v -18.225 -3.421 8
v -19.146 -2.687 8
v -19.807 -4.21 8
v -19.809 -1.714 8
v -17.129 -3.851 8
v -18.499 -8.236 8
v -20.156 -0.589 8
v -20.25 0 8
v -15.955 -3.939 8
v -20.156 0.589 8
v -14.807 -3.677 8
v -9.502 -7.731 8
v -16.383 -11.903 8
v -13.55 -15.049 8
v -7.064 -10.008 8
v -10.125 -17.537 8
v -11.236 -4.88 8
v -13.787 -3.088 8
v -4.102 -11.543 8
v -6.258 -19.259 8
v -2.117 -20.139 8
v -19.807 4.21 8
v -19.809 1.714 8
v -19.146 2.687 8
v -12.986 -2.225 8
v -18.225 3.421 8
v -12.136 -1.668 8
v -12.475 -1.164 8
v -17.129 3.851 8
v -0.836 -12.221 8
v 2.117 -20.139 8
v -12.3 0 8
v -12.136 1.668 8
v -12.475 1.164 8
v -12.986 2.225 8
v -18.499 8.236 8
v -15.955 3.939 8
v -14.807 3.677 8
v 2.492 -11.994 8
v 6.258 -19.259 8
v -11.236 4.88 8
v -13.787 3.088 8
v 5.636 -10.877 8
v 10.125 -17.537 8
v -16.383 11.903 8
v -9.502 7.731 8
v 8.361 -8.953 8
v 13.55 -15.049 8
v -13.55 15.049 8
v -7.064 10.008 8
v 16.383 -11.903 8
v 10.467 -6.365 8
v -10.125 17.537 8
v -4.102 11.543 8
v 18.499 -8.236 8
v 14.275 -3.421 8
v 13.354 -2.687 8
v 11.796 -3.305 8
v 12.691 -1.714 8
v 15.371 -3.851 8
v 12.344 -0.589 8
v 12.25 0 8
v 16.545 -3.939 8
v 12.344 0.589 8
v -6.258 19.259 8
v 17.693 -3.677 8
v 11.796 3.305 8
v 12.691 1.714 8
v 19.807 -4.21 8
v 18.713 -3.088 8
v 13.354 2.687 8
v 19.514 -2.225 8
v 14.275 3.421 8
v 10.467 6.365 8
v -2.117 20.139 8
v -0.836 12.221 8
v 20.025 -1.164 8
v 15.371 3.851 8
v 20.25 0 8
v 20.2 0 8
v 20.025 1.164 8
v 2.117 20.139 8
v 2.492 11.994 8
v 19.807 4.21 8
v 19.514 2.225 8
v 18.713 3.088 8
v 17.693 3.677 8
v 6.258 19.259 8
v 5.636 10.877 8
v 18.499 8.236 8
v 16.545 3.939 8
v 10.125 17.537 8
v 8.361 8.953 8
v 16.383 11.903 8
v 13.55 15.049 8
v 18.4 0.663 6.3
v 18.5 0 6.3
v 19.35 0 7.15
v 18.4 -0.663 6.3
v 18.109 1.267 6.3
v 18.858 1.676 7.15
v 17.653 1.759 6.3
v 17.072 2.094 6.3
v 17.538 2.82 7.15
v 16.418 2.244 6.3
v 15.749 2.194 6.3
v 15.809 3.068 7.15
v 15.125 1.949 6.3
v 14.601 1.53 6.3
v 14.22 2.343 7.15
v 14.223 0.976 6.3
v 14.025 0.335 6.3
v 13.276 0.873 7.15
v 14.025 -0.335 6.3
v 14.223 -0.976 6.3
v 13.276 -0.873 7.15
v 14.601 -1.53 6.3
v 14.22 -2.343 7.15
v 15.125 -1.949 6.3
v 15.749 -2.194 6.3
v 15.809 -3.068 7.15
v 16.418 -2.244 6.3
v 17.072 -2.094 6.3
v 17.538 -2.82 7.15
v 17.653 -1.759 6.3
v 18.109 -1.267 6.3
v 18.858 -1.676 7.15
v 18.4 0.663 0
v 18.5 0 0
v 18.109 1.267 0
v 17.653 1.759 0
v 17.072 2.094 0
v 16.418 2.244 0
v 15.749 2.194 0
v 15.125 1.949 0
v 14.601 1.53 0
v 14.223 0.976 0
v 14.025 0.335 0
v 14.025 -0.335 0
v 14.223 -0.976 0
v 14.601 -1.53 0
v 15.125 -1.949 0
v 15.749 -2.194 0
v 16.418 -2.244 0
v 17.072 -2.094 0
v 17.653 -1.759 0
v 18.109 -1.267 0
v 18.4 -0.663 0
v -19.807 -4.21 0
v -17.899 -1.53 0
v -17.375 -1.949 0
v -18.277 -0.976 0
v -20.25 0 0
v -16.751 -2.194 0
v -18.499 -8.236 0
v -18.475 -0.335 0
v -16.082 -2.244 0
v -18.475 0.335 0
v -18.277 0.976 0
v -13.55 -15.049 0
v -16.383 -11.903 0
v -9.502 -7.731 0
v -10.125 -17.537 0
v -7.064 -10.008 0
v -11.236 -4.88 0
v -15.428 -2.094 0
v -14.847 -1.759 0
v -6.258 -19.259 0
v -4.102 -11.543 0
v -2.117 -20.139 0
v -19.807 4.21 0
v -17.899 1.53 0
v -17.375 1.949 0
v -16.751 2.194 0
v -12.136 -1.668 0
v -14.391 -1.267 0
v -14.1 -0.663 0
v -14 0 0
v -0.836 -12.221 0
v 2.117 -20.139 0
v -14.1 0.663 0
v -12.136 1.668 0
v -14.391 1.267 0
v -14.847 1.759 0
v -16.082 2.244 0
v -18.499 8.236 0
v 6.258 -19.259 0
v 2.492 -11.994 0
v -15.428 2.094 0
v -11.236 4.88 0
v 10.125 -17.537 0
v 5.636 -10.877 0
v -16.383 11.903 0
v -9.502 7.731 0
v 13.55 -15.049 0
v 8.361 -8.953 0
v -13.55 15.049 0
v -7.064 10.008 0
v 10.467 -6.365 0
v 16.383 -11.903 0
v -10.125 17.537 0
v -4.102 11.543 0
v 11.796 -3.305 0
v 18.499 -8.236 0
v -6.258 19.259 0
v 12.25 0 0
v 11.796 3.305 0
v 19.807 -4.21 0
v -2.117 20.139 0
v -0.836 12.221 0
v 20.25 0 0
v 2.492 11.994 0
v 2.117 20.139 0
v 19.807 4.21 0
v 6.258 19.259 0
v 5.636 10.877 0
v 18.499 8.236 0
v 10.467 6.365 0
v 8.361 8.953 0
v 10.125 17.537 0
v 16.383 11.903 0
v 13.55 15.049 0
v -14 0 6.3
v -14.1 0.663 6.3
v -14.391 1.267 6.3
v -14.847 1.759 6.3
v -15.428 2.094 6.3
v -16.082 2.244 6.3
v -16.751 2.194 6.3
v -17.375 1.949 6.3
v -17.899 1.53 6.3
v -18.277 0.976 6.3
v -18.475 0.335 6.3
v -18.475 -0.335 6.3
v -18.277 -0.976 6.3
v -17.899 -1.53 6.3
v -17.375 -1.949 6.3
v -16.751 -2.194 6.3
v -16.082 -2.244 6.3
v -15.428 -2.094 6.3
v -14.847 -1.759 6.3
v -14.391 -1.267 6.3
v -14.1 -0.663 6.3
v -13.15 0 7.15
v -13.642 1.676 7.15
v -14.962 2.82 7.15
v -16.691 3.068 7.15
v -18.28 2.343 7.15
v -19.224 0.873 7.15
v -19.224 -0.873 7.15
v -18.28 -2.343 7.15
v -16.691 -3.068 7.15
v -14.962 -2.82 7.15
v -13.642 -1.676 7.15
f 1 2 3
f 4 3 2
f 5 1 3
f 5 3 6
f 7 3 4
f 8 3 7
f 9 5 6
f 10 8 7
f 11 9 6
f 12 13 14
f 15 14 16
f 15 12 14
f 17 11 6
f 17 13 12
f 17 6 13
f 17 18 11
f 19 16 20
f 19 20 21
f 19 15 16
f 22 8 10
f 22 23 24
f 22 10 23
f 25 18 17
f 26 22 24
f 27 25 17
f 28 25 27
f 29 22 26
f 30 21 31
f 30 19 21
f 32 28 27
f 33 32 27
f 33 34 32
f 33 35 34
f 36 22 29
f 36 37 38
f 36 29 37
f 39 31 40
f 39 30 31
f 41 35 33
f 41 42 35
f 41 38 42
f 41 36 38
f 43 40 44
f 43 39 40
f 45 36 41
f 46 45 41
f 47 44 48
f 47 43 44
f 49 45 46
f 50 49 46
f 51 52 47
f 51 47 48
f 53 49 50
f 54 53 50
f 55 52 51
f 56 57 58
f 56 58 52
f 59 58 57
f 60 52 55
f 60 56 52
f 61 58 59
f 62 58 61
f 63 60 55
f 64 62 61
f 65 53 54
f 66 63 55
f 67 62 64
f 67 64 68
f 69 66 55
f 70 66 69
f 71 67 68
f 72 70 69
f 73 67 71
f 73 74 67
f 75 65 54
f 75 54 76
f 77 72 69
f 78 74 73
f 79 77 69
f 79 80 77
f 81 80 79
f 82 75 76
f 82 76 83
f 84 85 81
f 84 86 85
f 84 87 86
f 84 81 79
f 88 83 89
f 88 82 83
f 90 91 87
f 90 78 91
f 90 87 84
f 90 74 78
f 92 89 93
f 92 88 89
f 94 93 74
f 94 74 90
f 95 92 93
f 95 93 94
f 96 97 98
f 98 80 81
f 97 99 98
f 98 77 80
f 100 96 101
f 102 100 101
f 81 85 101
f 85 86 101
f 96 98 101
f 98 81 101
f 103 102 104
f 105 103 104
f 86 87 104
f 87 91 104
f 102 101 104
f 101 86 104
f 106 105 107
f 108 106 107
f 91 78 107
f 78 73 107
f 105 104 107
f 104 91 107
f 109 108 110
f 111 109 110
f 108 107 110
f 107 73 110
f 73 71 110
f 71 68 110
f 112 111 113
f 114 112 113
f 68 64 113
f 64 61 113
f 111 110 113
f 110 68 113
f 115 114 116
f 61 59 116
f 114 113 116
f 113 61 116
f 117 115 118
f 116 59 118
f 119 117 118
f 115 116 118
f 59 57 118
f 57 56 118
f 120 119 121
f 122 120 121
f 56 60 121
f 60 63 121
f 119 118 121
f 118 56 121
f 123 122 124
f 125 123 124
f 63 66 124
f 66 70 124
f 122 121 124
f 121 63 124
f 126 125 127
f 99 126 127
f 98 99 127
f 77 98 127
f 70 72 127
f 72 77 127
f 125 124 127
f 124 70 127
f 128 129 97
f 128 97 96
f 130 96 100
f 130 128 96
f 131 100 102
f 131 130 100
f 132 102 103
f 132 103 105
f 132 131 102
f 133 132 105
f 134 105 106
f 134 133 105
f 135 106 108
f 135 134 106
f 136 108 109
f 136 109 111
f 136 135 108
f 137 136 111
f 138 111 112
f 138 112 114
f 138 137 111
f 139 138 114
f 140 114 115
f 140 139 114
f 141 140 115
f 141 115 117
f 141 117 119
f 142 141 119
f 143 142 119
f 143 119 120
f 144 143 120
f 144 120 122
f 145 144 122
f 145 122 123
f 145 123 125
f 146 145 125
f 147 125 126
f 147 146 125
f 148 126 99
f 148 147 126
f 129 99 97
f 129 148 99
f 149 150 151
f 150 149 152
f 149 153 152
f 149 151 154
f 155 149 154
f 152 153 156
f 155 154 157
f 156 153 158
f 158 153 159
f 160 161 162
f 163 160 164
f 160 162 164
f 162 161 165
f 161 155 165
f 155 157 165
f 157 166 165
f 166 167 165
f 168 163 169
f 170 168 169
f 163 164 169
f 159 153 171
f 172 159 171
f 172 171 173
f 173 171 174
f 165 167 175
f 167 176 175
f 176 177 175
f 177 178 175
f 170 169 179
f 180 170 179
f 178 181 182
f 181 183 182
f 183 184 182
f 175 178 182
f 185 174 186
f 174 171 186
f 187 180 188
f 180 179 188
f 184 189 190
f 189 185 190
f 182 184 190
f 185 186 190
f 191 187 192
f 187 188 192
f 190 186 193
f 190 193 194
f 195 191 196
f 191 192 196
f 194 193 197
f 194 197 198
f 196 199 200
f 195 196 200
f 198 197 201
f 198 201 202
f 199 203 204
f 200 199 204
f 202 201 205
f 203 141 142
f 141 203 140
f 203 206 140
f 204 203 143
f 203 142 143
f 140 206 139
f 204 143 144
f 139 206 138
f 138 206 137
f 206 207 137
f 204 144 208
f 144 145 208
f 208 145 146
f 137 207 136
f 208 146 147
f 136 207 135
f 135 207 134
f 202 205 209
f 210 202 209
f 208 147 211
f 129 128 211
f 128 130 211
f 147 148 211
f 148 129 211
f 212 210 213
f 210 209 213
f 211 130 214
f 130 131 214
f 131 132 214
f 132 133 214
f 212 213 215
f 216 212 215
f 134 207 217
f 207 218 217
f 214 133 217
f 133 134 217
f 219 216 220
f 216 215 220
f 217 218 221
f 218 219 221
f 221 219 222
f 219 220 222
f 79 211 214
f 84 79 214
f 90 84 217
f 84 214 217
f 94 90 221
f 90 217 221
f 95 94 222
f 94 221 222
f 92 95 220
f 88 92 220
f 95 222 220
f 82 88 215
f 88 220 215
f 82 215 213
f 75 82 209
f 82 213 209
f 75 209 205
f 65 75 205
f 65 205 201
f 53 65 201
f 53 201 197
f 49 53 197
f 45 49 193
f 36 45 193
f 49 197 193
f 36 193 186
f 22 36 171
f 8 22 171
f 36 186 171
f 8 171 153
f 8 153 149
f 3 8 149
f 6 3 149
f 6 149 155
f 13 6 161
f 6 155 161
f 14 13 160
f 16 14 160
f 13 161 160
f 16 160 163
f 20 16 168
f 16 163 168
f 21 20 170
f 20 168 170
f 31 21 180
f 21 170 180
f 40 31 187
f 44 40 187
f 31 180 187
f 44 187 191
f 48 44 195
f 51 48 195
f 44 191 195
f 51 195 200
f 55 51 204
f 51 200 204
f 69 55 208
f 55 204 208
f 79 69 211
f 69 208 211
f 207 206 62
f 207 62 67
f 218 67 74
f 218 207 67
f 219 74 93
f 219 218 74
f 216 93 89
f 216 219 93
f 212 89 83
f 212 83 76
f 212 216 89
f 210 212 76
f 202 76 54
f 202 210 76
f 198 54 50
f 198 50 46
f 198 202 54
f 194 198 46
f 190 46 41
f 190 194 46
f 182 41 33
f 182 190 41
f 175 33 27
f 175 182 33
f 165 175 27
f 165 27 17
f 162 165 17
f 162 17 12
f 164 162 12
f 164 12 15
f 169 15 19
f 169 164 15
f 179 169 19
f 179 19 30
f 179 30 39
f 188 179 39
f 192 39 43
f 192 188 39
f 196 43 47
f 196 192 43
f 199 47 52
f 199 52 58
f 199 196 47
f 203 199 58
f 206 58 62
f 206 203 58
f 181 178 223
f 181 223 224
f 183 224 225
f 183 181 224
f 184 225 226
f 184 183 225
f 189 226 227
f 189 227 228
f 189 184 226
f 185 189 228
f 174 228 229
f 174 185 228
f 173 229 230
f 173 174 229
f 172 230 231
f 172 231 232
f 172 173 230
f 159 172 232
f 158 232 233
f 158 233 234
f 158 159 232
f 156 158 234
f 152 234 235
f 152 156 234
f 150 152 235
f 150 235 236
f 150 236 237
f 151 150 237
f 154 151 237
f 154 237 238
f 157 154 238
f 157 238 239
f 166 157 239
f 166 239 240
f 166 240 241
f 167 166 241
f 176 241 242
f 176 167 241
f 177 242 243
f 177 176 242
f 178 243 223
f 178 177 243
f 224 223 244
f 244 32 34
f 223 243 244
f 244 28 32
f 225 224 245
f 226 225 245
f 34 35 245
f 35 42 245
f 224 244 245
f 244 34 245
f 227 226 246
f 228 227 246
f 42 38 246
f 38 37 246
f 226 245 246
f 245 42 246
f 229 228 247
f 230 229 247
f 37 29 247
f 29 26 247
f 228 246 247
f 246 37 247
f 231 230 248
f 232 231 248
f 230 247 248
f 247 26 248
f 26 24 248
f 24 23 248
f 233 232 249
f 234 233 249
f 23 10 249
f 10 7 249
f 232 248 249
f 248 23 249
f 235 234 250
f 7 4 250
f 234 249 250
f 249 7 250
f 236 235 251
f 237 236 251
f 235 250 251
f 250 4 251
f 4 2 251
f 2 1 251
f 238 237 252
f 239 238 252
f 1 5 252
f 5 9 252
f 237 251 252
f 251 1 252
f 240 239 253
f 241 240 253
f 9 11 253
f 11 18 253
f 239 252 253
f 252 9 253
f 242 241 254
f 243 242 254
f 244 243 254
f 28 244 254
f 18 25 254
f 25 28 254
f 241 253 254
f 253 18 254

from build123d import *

# Parameters (mm, degrees)
SKETCH_R     = 20.25
SKETCH_R_2   = 12.25
SKETCH_R_3   = 2.25
PAD_DEPTH    = 8
CHAMFER_SIZE = 1.7


with BuildPart() as part:
    # Sketch → Pad (new body)
    with BuildSketch(Plane.XY):
        Circle(SKETCH_R)
        Circle(SKETCH_R_2, mode=Mode.SUBTRACT)
        with Locations((16.25, 0)):
            Circle(SKETCH_R_3, mode=Mode.SUBTRACT)
        with Locations((-16.25, 0)):
            Circle(SKETCH_R_3, mode=Mode.SUBTRACT)
    extrude(amount=PAD_DEPTH)

    # Chamfer
    chamfer_edges = [part.edges().sort_by_distance(p)[0] for p in [
        (14, 0, 8),
        (-18.5, 0, 8),
    ]]
    chamfer(chamfer_edges, length=CHAMFER_SIZE)


solid = part.part
